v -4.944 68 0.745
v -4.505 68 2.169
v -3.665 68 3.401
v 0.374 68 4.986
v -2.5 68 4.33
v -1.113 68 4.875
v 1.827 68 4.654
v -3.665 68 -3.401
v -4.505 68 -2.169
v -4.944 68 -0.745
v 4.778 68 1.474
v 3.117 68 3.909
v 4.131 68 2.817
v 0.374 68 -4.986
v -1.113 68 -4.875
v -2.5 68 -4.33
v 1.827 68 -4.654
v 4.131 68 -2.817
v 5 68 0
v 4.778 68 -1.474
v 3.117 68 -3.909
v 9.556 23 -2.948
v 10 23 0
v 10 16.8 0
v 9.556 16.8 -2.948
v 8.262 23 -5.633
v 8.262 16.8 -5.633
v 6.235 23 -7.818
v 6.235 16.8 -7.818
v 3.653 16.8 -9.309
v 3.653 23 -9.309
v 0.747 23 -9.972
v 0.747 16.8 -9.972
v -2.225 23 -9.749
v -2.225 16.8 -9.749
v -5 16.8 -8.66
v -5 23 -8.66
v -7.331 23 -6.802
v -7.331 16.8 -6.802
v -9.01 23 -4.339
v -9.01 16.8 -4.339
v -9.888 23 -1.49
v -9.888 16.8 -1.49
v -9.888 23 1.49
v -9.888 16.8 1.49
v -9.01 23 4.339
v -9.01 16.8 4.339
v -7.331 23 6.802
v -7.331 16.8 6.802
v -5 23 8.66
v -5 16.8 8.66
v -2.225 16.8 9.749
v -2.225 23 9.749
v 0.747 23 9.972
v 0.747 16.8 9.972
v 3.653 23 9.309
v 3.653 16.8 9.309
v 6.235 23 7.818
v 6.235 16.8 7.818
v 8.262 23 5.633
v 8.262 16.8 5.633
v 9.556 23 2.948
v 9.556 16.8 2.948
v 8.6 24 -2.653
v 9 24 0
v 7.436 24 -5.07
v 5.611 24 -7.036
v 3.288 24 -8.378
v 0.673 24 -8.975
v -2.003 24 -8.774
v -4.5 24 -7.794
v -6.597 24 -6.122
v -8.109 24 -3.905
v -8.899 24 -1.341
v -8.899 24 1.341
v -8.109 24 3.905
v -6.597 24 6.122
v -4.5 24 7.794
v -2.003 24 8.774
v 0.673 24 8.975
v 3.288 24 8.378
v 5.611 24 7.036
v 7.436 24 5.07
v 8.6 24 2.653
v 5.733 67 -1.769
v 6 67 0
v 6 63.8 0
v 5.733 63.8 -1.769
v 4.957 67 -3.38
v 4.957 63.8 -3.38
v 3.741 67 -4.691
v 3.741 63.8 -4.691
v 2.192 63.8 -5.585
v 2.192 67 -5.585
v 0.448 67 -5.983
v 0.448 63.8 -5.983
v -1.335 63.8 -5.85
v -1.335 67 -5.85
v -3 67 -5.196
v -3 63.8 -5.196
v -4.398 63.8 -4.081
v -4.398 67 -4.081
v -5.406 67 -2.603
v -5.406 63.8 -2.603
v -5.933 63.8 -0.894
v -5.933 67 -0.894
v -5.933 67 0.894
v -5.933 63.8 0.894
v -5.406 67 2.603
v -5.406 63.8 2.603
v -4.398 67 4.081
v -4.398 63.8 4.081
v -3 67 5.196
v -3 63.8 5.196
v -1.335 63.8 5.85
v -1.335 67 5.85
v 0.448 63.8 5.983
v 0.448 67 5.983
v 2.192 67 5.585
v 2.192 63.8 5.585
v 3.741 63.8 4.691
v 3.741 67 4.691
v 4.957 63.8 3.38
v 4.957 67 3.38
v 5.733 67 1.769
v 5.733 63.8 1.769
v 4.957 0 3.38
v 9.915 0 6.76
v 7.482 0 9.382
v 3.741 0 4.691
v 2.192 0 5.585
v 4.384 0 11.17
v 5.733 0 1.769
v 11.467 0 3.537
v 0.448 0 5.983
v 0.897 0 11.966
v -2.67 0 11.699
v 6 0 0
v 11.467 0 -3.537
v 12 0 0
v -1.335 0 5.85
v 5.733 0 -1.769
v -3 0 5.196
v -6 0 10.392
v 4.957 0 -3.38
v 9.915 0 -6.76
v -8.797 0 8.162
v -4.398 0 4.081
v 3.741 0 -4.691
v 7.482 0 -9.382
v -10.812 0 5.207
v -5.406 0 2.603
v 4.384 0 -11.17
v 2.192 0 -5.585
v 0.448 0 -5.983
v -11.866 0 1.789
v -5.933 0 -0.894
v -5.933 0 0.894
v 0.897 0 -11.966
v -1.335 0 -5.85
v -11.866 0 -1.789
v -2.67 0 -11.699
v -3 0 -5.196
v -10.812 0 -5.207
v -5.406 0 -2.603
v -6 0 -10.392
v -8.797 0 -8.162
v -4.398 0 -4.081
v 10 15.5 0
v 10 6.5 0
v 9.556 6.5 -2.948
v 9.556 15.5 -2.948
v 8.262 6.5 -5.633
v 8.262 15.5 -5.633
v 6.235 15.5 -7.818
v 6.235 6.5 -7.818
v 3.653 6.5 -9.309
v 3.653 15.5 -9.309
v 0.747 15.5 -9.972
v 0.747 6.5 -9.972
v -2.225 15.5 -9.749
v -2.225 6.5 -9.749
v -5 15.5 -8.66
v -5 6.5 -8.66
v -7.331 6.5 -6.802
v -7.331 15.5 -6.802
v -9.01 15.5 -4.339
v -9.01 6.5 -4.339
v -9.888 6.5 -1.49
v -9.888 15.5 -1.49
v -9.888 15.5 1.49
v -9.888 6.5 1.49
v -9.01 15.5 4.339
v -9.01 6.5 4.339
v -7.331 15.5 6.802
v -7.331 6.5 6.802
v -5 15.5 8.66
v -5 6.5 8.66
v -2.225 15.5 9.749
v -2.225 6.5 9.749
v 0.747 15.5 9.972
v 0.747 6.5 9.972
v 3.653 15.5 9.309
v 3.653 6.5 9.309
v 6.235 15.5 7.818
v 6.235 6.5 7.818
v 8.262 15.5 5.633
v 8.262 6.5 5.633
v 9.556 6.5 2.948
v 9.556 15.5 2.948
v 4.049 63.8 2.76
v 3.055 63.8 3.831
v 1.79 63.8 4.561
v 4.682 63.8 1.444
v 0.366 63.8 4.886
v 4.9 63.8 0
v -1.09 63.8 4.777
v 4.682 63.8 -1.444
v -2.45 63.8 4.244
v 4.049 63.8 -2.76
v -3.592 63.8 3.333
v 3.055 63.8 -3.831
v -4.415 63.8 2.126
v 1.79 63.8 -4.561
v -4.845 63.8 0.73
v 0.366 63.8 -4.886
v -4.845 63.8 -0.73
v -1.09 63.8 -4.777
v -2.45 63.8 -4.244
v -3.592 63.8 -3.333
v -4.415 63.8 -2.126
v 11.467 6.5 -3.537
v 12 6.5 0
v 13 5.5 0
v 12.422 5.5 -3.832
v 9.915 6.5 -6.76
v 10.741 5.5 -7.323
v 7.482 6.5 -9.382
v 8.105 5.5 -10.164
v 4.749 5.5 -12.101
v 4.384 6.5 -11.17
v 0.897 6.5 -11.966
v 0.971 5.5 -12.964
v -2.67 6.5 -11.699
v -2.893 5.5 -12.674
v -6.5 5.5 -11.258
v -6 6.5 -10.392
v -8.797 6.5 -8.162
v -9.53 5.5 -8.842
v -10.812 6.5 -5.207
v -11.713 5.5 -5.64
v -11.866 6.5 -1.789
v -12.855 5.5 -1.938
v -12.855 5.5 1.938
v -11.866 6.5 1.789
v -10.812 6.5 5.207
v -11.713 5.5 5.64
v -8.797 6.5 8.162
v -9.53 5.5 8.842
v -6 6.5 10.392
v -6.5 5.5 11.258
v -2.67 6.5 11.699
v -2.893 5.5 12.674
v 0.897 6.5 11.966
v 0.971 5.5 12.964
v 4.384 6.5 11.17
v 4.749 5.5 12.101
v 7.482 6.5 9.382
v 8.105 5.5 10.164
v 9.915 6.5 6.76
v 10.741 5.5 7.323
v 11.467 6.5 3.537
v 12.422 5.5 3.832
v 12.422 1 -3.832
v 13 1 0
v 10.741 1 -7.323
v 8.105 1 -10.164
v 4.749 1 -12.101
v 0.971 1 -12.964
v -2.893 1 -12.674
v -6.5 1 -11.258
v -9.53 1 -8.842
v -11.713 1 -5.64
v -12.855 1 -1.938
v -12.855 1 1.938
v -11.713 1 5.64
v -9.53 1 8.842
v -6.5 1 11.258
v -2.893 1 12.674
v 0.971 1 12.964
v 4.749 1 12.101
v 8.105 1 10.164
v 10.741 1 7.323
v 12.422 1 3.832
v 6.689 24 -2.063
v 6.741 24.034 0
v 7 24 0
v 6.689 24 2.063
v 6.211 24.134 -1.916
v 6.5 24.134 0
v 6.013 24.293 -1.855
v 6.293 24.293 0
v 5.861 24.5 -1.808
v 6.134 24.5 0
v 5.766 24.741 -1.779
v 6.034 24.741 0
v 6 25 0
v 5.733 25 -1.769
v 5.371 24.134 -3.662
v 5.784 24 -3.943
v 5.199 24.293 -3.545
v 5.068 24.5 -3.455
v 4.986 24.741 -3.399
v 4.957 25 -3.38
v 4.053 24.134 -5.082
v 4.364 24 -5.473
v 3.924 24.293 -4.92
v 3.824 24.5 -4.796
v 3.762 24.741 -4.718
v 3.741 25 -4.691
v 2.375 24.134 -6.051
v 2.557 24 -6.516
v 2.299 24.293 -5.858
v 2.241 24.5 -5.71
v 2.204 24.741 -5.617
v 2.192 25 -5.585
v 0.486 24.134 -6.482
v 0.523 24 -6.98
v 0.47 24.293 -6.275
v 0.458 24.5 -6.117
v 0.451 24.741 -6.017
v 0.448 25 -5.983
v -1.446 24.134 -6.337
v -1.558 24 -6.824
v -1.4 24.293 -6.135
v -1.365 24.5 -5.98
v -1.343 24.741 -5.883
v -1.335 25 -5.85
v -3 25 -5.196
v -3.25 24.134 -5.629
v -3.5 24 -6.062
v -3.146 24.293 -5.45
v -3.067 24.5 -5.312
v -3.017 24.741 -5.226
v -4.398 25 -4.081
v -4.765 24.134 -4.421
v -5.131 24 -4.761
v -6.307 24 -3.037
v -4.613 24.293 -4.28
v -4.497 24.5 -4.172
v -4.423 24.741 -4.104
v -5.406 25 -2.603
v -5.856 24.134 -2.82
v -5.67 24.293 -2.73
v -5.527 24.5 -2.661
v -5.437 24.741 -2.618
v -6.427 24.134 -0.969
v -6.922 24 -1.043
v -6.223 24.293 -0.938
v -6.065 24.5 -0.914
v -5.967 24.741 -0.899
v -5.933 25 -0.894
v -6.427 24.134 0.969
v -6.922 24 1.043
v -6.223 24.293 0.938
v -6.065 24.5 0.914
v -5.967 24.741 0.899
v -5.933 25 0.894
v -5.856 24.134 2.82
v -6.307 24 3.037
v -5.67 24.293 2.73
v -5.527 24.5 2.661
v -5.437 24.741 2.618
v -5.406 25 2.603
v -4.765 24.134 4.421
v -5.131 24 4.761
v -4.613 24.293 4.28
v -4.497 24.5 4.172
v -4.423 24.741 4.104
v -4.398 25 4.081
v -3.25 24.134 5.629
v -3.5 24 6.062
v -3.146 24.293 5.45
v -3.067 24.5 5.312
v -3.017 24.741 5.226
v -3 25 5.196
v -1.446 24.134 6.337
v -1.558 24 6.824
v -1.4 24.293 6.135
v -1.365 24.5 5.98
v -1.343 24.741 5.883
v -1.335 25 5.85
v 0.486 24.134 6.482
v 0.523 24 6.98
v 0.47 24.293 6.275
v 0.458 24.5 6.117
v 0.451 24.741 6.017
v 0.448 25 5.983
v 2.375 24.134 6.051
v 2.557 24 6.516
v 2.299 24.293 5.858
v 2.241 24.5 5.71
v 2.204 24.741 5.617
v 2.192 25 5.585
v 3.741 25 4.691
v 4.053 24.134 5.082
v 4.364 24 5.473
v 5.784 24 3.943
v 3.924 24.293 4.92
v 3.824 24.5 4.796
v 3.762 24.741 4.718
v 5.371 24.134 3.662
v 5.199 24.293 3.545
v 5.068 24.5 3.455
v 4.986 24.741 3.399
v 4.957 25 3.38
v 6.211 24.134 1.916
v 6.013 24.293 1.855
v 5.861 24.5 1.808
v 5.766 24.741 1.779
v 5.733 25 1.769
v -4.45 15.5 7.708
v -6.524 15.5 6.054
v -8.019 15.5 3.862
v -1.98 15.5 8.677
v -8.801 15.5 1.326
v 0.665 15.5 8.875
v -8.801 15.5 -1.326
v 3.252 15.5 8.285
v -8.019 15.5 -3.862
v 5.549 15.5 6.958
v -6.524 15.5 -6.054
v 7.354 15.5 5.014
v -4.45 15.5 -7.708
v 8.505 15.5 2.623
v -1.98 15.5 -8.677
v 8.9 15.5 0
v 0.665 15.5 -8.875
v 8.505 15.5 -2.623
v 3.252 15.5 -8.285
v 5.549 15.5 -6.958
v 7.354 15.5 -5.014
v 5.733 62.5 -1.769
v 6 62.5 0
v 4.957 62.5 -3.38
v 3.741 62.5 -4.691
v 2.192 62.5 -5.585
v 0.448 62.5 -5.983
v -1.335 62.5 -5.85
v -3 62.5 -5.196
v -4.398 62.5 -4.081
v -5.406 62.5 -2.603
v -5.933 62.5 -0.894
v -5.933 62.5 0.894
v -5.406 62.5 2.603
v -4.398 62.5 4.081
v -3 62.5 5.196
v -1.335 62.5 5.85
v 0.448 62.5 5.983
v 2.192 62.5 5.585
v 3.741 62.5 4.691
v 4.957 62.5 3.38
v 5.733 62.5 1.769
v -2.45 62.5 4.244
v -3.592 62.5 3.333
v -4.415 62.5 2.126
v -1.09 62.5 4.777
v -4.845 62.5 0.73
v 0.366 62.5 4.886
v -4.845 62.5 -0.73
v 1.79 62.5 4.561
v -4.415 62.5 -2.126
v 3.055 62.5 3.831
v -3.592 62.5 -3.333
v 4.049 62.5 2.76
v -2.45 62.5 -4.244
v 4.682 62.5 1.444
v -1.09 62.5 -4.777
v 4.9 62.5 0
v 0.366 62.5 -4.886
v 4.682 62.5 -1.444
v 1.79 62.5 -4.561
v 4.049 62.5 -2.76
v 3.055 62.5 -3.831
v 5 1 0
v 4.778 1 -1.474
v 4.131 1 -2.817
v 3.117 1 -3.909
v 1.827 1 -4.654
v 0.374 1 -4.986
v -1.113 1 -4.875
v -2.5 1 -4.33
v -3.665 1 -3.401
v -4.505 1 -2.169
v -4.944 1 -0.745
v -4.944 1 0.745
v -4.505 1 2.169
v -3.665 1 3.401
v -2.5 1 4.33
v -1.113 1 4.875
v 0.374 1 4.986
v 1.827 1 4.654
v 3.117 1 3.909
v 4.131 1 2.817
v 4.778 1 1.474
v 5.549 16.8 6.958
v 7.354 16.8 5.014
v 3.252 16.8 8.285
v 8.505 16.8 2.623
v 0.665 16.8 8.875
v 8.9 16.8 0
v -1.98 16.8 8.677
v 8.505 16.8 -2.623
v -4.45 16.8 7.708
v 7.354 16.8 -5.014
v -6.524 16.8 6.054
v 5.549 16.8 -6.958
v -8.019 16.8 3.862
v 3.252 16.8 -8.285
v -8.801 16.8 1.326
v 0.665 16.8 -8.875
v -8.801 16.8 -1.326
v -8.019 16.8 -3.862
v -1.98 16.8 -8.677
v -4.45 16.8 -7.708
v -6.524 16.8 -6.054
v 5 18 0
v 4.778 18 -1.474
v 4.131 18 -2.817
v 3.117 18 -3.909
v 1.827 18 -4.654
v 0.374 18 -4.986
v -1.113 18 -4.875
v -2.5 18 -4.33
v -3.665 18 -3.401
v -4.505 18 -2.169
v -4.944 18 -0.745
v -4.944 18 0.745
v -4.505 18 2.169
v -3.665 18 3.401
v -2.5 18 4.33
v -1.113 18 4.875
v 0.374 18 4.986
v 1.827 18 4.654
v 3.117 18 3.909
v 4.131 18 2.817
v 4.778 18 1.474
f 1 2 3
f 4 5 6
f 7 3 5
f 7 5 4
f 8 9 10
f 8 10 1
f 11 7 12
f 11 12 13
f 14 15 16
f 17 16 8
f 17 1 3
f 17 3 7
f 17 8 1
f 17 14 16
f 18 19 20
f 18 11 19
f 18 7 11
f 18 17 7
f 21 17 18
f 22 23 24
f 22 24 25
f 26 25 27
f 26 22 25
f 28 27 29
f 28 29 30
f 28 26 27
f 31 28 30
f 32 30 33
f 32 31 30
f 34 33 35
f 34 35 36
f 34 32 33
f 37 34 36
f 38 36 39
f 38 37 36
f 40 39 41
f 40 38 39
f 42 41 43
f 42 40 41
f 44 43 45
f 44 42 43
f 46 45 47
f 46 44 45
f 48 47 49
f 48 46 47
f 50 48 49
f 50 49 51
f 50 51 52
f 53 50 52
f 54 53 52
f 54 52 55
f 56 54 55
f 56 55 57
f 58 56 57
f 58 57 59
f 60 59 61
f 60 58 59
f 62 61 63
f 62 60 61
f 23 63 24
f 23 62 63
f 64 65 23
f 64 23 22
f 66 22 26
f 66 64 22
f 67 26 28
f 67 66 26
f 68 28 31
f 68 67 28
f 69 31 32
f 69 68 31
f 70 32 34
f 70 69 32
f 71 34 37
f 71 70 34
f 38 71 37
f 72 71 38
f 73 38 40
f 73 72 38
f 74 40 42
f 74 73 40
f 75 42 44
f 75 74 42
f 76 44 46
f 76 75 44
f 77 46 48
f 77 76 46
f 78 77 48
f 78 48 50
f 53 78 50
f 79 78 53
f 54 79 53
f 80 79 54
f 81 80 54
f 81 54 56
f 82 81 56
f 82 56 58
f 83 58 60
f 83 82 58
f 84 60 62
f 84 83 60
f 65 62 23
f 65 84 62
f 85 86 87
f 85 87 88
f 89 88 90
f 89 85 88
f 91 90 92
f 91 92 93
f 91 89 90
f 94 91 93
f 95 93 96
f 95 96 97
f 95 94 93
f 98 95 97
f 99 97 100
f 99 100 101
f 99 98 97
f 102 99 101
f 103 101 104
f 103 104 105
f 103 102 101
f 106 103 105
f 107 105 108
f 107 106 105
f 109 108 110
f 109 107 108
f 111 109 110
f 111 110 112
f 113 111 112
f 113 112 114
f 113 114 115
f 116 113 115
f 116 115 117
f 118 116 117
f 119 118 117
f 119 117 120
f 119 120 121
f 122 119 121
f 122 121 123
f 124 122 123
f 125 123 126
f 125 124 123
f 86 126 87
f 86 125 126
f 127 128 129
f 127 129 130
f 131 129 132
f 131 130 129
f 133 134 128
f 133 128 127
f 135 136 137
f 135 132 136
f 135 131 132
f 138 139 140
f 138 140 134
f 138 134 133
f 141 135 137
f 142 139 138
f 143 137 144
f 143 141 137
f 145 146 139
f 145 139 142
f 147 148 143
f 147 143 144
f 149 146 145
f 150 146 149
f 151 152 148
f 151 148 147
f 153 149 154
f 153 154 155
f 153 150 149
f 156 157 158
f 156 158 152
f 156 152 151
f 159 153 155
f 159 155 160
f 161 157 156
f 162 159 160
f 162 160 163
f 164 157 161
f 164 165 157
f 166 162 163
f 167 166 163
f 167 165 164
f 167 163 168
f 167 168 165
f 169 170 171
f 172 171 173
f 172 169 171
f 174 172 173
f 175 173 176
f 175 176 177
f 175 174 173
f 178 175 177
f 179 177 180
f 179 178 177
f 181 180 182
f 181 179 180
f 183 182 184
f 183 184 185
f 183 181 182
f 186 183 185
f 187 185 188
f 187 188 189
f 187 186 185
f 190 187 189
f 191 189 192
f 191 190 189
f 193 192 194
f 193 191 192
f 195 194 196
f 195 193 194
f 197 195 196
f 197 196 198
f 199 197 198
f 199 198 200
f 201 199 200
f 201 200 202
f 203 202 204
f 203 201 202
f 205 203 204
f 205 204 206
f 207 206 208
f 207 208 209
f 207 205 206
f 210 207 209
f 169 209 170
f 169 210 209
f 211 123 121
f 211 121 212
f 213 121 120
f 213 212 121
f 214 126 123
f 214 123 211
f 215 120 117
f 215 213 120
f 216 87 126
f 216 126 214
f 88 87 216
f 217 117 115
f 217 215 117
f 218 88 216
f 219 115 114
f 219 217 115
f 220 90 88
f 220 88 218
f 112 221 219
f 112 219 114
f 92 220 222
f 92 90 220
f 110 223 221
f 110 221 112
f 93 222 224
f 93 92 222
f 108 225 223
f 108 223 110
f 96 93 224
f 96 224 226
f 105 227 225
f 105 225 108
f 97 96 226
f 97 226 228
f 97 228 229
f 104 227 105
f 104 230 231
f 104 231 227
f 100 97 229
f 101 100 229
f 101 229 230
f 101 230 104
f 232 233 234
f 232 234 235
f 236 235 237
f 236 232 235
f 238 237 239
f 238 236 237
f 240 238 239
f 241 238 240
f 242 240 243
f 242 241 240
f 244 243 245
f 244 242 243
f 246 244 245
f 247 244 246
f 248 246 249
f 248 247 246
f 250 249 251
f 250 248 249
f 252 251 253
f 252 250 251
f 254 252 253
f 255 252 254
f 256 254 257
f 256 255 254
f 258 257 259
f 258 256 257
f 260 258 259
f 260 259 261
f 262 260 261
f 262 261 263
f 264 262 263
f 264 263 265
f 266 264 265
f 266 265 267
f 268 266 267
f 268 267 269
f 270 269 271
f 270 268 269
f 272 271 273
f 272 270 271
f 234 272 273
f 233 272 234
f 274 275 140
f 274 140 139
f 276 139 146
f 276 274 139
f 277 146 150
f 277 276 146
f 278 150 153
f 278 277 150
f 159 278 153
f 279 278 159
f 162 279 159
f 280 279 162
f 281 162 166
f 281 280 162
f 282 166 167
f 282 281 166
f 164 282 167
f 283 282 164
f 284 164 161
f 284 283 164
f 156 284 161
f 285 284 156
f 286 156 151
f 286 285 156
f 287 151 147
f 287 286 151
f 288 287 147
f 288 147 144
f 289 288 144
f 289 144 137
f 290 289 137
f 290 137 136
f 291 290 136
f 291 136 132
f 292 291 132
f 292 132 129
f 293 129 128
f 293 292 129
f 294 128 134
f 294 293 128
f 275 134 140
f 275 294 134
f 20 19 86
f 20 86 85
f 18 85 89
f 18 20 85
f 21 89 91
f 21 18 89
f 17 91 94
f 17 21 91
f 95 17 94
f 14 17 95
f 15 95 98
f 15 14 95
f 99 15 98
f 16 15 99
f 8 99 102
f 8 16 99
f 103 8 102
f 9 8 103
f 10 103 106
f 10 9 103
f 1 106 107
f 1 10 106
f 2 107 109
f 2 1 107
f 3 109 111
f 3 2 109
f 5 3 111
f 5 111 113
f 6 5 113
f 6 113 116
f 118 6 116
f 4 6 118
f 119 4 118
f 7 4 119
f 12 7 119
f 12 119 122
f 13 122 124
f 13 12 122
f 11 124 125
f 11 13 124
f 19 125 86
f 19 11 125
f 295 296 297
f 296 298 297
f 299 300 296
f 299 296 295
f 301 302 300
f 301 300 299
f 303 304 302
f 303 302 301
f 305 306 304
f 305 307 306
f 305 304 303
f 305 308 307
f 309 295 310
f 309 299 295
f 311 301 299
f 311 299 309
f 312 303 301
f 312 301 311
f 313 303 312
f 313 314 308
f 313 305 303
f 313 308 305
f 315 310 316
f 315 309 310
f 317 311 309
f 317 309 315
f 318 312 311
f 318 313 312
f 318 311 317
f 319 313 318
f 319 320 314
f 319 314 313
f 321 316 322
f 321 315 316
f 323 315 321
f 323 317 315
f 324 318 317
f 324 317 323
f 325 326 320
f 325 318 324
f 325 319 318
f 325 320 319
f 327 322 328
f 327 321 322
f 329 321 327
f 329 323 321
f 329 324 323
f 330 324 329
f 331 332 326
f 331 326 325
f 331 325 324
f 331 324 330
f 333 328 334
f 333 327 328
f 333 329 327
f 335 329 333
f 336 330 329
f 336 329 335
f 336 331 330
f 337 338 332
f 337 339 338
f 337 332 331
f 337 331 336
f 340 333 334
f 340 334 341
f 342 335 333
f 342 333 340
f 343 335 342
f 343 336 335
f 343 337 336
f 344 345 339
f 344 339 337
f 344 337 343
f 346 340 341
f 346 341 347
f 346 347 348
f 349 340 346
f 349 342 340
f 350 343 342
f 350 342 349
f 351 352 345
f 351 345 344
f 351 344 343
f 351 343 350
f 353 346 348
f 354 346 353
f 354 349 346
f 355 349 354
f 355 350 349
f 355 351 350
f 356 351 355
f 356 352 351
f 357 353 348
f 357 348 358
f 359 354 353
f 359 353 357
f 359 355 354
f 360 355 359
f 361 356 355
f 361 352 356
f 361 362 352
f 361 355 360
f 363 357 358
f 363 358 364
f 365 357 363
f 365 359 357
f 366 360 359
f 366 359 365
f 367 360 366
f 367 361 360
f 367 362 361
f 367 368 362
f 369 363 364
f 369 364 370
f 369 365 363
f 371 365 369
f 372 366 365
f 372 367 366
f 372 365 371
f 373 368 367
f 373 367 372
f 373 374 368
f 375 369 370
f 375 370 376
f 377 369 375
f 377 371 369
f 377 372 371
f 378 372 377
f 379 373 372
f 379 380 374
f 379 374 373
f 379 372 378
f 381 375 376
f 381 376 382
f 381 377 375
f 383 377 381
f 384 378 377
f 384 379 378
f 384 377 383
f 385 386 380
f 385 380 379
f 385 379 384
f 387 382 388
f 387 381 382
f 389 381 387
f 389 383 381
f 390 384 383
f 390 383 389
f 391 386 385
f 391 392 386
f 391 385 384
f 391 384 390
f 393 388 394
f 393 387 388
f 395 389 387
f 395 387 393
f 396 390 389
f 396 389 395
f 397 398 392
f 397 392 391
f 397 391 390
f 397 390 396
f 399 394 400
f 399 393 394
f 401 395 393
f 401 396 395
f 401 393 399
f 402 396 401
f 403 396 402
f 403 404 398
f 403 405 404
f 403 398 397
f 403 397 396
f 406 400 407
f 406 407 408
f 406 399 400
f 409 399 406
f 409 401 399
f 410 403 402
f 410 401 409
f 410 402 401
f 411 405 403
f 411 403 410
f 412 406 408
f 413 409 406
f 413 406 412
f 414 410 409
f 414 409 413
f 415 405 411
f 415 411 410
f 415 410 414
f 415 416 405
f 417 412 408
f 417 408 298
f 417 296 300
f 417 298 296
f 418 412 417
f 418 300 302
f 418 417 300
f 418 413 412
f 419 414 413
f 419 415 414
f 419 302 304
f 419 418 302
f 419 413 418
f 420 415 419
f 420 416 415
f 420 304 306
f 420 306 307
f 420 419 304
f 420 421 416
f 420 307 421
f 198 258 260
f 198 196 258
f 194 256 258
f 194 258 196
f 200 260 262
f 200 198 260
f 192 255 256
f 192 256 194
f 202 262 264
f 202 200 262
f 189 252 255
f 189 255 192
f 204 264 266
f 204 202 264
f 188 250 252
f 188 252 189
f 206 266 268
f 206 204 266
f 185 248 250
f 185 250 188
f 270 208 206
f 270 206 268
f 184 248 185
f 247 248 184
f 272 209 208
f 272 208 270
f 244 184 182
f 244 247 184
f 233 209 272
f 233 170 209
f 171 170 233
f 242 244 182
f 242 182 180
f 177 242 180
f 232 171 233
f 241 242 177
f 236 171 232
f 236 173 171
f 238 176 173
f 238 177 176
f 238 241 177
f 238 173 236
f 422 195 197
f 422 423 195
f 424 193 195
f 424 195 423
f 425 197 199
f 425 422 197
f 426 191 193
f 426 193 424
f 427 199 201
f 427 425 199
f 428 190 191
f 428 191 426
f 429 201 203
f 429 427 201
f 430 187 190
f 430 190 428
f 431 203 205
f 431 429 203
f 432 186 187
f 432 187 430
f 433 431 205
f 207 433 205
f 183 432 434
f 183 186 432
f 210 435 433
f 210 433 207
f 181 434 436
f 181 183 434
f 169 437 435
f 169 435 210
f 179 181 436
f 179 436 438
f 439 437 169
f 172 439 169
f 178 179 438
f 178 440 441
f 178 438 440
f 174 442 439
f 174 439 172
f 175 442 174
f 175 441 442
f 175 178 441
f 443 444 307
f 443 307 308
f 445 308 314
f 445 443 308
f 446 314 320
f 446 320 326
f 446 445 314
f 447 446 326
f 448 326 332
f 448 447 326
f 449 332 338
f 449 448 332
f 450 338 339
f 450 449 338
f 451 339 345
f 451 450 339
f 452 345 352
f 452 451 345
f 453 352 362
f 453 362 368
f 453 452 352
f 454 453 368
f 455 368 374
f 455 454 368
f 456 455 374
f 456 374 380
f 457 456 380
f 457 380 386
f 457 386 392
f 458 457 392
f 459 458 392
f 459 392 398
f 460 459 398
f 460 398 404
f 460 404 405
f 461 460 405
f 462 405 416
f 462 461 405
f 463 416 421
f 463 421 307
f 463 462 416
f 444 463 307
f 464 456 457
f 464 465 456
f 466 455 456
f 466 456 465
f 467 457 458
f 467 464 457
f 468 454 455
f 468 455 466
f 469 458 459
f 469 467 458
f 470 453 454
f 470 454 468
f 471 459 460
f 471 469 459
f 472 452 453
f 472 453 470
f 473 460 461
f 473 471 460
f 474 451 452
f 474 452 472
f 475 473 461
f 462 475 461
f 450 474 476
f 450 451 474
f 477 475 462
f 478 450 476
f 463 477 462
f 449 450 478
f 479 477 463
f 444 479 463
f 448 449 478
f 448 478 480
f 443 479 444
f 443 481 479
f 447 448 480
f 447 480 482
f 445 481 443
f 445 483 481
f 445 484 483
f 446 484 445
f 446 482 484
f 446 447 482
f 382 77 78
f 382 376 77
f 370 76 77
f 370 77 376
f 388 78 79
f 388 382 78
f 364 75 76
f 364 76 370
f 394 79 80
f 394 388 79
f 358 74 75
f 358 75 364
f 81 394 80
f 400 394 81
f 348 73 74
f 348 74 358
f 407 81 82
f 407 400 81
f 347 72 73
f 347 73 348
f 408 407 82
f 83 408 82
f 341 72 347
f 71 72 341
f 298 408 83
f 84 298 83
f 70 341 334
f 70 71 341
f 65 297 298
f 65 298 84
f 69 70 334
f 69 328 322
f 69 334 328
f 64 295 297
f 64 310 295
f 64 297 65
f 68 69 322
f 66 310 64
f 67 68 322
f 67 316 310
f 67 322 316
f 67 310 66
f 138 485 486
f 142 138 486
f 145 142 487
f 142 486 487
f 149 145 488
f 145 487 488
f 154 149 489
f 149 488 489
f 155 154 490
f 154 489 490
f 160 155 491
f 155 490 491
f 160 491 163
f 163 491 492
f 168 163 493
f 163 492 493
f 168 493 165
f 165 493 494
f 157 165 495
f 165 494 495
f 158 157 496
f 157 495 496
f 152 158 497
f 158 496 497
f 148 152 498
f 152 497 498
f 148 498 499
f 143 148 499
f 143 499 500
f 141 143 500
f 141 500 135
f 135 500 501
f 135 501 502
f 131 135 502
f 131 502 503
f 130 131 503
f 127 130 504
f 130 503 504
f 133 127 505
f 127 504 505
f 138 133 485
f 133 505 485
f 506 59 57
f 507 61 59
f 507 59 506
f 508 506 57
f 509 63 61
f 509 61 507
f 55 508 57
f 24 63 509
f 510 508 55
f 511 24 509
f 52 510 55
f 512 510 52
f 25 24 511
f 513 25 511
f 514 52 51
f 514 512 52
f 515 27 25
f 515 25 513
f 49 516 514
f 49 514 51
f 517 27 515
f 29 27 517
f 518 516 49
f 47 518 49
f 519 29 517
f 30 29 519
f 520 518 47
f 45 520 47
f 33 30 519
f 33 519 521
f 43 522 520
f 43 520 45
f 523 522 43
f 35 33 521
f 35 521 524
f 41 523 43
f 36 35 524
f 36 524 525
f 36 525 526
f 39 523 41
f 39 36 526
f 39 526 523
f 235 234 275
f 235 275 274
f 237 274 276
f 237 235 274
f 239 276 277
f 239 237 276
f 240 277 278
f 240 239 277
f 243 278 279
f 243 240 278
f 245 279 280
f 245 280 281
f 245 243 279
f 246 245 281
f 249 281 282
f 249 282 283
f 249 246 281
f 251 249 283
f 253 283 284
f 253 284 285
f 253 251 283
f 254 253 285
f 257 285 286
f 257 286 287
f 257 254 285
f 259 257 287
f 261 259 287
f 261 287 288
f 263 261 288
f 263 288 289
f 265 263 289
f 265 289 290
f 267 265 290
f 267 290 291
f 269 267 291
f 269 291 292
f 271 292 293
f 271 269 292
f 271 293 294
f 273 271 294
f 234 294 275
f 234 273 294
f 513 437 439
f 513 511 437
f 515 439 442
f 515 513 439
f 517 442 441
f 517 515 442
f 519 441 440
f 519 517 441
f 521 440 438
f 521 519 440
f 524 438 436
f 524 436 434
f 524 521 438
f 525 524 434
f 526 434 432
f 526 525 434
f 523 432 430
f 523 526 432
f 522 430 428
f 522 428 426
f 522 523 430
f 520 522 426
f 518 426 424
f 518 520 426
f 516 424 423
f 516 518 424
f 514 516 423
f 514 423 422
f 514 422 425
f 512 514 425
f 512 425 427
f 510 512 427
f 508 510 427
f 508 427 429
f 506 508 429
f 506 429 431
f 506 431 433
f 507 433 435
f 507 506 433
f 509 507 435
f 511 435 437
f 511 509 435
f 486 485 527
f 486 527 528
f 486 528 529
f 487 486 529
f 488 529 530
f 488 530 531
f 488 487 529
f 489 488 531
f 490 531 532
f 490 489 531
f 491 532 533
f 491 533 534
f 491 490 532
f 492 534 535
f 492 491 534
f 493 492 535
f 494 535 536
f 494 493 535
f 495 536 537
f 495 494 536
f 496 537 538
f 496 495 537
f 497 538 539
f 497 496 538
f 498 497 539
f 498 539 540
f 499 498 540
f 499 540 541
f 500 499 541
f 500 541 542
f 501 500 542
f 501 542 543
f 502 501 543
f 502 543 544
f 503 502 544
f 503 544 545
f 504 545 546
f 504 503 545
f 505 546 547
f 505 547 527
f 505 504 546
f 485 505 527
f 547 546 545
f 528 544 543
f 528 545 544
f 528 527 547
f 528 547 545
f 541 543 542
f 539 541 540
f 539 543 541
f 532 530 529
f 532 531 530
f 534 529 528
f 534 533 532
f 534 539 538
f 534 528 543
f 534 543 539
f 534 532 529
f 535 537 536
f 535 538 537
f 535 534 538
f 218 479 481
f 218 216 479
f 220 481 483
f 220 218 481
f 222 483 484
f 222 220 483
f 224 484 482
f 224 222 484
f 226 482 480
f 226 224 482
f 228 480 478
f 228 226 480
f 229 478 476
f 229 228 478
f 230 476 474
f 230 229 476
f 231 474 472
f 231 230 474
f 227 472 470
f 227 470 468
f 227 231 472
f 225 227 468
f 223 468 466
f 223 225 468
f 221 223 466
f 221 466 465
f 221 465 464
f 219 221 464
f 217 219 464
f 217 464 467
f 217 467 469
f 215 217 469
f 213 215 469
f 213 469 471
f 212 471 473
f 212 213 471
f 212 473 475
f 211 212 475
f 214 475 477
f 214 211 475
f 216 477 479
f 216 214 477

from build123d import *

# Parameters (mm, degrees)
CHAMFER1_SIZE = 1
FILLET2_R     = 1


with BuildPart() as part:
    # Sketch1 → Revolve1 (revolve)
    with BuildSketch(Plane.XY):
        Polygon((-5, 0), (-13, 0), (-13, 6.5), (-10, 6.5), (-10, 15.5), (-8.9, 15.5), (-8.9, 16.8), (-10, 16.8), (-10, 24), (-6, 24), (-6, 62.5), (-4.9, 62.5), (-4.9, 63.8), (-6, 63.8), (-6, 68), (0, 68), (0, 18), (-5, 18), align=None)
    revolve(axis=Axis((0, 0, 0), (0, 1, 0)))

    # Chamfer1
    chamfer1_edges = [part.edges().sort_by_distance(p)[0] for p in [
        (5, 0, 0),
        (13, 0, 0),
        (13, 6.5, 0),
        (10, 24, 0),
        (6, 68, 0),
    ]]
    chamfer(chamfer1_edges, length=CHAMFER1_SIZE)

    # Fillet2
    fillet2_edges = [part.edges().sort_by_distance(p)[0] for p in [
        (6, 24, 0),
    ]]
    fillet(fillet2_edges, radius=FILLET2_R)


solid = part.part
